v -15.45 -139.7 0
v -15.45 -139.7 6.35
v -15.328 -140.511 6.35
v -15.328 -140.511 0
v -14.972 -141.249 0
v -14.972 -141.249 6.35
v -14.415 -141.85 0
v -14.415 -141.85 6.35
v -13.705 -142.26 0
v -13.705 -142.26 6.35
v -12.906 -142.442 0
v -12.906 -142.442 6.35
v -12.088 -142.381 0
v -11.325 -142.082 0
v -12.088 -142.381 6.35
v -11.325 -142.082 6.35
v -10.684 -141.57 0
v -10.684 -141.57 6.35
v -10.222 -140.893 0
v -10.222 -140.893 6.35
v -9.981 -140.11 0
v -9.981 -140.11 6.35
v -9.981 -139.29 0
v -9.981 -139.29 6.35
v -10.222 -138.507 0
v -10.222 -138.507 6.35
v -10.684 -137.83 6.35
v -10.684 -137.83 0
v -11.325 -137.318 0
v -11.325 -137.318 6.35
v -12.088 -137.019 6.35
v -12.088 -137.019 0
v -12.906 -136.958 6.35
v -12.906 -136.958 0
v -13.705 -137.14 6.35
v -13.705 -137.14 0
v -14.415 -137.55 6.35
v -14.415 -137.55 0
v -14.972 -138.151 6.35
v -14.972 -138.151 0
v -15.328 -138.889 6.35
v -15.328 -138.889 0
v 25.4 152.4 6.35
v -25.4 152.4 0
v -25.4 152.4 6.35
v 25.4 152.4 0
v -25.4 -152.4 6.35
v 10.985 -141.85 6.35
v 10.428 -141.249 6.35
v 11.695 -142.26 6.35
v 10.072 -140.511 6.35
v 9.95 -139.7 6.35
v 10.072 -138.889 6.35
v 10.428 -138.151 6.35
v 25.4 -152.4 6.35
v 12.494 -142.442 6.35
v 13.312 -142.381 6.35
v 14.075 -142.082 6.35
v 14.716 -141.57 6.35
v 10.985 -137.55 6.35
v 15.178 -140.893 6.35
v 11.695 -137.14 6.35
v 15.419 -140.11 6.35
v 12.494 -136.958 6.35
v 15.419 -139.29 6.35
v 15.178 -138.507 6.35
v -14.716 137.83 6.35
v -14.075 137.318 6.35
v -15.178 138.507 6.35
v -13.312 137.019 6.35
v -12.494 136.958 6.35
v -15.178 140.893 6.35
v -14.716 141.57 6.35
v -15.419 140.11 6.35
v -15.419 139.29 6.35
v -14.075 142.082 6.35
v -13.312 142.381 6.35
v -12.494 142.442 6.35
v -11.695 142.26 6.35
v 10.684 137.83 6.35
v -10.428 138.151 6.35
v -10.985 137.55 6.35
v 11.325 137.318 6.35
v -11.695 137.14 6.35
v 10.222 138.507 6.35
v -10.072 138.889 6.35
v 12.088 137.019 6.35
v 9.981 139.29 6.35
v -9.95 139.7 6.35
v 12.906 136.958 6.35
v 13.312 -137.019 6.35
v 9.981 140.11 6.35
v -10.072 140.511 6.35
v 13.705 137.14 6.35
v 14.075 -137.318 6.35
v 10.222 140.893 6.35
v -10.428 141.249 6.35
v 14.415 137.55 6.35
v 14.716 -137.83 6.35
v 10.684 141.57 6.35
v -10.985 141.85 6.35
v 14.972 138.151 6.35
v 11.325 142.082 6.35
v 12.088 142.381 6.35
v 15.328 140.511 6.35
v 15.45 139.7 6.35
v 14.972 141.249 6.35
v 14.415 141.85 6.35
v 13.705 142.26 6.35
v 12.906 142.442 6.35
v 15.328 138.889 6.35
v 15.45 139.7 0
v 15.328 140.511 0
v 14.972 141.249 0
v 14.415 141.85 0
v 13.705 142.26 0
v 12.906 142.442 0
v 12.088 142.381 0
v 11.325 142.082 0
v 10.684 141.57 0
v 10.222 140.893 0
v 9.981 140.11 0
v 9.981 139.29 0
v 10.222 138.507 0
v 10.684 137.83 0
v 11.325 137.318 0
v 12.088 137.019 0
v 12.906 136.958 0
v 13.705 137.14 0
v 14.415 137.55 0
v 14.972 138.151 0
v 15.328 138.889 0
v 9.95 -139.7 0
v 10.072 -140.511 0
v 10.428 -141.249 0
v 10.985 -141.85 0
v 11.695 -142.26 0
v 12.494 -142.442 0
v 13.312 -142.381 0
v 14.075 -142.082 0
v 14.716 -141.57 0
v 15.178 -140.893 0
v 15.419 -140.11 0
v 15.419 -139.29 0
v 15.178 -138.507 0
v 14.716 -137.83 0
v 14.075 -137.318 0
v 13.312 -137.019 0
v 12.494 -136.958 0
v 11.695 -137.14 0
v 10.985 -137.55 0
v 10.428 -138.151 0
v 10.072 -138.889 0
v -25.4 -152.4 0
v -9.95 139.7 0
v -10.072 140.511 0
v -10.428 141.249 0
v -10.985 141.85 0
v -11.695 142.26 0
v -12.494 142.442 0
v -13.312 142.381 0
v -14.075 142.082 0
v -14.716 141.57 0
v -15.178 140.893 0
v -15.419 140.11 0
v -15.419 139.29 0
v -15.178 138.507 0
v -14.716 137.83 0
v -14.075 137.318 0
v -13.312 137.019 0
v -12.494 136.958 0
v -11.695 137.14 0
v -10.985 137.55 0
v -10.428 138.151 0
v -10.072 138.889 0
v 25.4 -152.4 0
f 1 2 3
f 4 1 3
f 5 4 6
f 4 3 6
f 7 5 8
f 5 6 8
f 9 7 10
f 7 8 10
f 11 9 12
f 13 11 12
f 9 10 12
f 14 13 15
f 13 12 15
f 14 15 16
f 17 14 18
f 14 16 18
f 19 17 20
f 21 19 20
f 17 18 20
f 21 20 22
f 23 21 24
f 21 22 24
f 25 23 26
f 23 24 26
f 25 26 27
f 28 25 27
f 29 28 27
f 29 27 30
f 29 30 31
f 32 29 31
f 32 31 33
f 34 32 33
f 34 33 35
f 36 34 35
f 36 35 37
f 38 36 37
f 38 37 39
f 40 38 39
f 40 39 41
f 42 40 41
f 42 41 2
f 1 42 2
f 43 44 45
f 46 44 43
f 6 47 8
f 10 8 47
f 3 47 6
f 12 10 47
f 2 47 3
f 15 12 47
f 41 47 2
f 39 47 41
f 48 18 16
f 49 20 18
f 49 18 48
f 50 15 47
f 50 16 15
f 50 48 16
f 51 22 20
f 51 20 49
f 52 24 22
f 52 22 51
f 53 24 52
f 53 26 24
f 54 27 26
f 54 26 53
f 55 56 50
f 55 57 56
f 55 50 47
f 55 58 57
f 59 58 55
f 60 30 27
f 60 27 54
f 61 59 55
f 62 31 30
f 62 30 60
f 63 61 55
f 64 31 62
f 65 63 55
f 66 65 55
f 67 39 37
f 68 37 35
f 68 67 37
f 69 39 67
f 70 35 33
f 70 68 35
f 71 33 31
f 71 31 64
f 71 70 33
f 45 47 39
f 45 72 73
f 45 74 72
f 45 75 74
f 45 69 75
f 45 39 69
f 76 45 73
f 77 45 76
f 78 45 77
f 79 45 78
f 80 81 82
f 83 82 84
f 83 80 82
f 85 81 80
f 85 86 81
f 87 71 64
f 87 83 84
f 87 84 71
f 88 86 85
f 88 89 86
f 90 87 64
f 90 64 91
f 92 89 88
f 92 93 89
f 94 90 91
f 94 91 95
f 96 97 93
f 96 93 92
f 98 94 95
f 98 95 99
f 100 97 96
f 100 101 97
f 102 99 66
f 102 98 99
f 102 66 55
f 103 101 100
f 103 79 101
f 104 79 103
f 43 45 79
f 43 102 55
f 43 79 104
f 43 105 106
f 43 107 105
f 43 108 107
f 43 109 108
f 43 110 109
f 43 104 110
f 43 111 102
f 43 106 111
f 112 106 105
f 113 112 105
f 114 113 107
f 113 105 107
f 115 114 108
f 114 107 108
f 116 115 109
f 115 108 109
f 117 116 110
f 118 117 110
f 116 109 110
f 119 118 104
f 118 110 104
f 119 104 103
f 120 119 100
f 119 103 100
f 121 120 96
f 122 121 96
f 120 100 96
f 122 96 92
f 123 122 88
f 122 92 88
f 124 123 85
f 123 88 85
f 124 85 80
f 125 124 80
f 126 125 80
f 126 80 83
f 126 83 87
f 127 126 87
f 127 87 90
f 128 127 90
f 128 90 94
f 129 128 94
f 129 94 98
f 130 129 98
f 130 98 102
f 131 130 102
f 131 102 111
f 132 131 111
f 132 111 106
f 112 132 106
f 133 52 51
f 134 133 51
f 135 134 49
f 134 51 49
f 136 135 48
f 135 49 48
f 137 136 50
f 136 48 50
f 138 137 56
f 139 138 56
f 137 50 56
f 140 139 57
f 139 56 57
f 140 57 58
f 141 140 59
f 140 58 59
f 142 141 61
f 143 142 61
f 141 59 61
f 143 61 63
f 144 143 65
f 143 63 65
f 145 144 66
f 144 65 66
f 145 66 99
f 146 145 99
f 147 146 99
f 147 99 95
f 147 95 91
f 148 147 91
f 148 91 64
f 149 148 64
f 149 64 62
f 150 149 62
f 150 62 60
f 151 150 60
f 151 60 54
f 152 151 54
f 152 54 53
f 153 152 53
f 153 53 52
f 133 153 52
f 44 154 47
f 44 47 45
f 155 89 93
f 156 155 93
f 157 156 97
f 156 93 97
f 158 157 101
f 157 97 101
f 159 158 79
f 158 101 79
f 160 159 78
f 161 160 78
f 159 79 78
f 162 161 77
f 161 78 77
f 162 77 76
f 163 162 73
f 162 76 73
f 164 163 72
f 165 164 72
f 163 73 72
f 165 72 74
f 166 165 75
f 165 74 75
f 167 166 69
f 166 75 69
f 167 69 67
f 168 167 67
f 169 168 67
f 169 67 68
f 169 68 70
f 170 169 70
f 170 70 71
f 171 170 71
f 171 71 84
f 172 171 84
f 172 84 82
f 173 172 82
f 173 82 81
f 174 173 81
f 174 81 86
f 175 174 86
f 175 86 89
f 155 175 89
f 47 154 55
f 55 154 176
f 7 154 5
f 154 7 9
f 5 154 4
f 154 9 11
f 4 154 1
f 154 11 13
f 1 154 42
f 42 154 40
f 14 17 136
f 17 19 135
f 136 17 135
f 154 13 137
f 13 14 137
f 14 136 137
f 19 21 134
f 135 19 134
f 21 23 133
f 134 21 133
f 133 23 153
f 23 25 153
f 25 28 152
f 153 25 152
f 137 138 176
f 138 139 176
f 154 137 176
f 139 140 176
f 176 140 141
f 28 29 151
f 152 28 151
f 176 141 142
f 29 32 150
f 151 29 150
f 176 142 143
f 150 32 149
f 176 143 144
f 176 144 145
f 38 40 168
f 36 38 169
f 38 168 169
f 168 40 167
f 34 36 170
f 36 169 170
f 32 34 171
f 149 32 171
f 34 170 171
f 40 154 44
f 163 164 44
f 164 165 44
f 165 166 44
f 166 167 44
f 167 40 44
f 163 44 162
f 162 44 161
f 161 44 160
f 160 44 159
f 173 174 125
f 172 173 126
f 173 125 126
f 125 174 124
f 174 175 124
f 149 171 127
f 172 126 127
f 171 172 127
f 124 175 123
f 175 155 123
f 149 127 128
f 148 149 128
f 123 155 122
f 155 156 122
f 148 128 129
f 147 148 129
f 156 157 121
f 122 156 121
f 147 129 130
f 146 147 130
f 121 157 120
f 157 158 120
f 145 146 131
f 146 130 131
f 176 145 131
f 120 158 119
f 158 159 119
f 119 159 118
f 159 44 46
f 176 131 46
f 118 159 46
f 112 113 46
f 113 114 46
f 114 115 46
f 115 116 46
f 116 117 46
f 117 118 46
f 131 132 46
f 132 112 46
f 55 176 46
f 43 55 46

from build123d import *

# Parameters (mm, degrees)
ESQUISSE1_W             = 50.8
ESQUISSE1_H             = 304.8
BOSS_EXTRU_1_DEPTH      = 6.35
ESQUISSE2_R             = 2.75
ENL_V_MAT_EXTRU_1_DEPTH = 155.632604906


with BuildPart() as part:
    # Esquisse1 → Boss.-Extru.1 (new body)
    with BuildSketch(Plane.XY):
        Rectangle(ESQUISSE1_W, ESQUISSE1_H)
    extrude(amount=BOSS_EXTRU_1_DEPTH)

    # Esquisse2 → Enlèv. mat.-Extru.1 (cut, through all)
    with BuildSketch(Plane.XY.offset(6.35)):
        with Locations((12.7, 139.7)):
            Circle(ESQUISSE2_R)
        with Locations((-12.7, 139.7)):
            Circle(ESQUISSE2_R)
        with Locations(Location((12.7, -139.7, 0), (0, 0, 180))):
            Circle(ESQUISSE2_R)
        with Locations(Location((-12.7, -139.7, 0), (0, 0, 180))):
            Circle(ESQUISSE2_R)
    extrude(amount=-ENL_V_MAT_EXTRU_1_DEPTH, mode=Mode.SUBTRACT)


solid = part.part
